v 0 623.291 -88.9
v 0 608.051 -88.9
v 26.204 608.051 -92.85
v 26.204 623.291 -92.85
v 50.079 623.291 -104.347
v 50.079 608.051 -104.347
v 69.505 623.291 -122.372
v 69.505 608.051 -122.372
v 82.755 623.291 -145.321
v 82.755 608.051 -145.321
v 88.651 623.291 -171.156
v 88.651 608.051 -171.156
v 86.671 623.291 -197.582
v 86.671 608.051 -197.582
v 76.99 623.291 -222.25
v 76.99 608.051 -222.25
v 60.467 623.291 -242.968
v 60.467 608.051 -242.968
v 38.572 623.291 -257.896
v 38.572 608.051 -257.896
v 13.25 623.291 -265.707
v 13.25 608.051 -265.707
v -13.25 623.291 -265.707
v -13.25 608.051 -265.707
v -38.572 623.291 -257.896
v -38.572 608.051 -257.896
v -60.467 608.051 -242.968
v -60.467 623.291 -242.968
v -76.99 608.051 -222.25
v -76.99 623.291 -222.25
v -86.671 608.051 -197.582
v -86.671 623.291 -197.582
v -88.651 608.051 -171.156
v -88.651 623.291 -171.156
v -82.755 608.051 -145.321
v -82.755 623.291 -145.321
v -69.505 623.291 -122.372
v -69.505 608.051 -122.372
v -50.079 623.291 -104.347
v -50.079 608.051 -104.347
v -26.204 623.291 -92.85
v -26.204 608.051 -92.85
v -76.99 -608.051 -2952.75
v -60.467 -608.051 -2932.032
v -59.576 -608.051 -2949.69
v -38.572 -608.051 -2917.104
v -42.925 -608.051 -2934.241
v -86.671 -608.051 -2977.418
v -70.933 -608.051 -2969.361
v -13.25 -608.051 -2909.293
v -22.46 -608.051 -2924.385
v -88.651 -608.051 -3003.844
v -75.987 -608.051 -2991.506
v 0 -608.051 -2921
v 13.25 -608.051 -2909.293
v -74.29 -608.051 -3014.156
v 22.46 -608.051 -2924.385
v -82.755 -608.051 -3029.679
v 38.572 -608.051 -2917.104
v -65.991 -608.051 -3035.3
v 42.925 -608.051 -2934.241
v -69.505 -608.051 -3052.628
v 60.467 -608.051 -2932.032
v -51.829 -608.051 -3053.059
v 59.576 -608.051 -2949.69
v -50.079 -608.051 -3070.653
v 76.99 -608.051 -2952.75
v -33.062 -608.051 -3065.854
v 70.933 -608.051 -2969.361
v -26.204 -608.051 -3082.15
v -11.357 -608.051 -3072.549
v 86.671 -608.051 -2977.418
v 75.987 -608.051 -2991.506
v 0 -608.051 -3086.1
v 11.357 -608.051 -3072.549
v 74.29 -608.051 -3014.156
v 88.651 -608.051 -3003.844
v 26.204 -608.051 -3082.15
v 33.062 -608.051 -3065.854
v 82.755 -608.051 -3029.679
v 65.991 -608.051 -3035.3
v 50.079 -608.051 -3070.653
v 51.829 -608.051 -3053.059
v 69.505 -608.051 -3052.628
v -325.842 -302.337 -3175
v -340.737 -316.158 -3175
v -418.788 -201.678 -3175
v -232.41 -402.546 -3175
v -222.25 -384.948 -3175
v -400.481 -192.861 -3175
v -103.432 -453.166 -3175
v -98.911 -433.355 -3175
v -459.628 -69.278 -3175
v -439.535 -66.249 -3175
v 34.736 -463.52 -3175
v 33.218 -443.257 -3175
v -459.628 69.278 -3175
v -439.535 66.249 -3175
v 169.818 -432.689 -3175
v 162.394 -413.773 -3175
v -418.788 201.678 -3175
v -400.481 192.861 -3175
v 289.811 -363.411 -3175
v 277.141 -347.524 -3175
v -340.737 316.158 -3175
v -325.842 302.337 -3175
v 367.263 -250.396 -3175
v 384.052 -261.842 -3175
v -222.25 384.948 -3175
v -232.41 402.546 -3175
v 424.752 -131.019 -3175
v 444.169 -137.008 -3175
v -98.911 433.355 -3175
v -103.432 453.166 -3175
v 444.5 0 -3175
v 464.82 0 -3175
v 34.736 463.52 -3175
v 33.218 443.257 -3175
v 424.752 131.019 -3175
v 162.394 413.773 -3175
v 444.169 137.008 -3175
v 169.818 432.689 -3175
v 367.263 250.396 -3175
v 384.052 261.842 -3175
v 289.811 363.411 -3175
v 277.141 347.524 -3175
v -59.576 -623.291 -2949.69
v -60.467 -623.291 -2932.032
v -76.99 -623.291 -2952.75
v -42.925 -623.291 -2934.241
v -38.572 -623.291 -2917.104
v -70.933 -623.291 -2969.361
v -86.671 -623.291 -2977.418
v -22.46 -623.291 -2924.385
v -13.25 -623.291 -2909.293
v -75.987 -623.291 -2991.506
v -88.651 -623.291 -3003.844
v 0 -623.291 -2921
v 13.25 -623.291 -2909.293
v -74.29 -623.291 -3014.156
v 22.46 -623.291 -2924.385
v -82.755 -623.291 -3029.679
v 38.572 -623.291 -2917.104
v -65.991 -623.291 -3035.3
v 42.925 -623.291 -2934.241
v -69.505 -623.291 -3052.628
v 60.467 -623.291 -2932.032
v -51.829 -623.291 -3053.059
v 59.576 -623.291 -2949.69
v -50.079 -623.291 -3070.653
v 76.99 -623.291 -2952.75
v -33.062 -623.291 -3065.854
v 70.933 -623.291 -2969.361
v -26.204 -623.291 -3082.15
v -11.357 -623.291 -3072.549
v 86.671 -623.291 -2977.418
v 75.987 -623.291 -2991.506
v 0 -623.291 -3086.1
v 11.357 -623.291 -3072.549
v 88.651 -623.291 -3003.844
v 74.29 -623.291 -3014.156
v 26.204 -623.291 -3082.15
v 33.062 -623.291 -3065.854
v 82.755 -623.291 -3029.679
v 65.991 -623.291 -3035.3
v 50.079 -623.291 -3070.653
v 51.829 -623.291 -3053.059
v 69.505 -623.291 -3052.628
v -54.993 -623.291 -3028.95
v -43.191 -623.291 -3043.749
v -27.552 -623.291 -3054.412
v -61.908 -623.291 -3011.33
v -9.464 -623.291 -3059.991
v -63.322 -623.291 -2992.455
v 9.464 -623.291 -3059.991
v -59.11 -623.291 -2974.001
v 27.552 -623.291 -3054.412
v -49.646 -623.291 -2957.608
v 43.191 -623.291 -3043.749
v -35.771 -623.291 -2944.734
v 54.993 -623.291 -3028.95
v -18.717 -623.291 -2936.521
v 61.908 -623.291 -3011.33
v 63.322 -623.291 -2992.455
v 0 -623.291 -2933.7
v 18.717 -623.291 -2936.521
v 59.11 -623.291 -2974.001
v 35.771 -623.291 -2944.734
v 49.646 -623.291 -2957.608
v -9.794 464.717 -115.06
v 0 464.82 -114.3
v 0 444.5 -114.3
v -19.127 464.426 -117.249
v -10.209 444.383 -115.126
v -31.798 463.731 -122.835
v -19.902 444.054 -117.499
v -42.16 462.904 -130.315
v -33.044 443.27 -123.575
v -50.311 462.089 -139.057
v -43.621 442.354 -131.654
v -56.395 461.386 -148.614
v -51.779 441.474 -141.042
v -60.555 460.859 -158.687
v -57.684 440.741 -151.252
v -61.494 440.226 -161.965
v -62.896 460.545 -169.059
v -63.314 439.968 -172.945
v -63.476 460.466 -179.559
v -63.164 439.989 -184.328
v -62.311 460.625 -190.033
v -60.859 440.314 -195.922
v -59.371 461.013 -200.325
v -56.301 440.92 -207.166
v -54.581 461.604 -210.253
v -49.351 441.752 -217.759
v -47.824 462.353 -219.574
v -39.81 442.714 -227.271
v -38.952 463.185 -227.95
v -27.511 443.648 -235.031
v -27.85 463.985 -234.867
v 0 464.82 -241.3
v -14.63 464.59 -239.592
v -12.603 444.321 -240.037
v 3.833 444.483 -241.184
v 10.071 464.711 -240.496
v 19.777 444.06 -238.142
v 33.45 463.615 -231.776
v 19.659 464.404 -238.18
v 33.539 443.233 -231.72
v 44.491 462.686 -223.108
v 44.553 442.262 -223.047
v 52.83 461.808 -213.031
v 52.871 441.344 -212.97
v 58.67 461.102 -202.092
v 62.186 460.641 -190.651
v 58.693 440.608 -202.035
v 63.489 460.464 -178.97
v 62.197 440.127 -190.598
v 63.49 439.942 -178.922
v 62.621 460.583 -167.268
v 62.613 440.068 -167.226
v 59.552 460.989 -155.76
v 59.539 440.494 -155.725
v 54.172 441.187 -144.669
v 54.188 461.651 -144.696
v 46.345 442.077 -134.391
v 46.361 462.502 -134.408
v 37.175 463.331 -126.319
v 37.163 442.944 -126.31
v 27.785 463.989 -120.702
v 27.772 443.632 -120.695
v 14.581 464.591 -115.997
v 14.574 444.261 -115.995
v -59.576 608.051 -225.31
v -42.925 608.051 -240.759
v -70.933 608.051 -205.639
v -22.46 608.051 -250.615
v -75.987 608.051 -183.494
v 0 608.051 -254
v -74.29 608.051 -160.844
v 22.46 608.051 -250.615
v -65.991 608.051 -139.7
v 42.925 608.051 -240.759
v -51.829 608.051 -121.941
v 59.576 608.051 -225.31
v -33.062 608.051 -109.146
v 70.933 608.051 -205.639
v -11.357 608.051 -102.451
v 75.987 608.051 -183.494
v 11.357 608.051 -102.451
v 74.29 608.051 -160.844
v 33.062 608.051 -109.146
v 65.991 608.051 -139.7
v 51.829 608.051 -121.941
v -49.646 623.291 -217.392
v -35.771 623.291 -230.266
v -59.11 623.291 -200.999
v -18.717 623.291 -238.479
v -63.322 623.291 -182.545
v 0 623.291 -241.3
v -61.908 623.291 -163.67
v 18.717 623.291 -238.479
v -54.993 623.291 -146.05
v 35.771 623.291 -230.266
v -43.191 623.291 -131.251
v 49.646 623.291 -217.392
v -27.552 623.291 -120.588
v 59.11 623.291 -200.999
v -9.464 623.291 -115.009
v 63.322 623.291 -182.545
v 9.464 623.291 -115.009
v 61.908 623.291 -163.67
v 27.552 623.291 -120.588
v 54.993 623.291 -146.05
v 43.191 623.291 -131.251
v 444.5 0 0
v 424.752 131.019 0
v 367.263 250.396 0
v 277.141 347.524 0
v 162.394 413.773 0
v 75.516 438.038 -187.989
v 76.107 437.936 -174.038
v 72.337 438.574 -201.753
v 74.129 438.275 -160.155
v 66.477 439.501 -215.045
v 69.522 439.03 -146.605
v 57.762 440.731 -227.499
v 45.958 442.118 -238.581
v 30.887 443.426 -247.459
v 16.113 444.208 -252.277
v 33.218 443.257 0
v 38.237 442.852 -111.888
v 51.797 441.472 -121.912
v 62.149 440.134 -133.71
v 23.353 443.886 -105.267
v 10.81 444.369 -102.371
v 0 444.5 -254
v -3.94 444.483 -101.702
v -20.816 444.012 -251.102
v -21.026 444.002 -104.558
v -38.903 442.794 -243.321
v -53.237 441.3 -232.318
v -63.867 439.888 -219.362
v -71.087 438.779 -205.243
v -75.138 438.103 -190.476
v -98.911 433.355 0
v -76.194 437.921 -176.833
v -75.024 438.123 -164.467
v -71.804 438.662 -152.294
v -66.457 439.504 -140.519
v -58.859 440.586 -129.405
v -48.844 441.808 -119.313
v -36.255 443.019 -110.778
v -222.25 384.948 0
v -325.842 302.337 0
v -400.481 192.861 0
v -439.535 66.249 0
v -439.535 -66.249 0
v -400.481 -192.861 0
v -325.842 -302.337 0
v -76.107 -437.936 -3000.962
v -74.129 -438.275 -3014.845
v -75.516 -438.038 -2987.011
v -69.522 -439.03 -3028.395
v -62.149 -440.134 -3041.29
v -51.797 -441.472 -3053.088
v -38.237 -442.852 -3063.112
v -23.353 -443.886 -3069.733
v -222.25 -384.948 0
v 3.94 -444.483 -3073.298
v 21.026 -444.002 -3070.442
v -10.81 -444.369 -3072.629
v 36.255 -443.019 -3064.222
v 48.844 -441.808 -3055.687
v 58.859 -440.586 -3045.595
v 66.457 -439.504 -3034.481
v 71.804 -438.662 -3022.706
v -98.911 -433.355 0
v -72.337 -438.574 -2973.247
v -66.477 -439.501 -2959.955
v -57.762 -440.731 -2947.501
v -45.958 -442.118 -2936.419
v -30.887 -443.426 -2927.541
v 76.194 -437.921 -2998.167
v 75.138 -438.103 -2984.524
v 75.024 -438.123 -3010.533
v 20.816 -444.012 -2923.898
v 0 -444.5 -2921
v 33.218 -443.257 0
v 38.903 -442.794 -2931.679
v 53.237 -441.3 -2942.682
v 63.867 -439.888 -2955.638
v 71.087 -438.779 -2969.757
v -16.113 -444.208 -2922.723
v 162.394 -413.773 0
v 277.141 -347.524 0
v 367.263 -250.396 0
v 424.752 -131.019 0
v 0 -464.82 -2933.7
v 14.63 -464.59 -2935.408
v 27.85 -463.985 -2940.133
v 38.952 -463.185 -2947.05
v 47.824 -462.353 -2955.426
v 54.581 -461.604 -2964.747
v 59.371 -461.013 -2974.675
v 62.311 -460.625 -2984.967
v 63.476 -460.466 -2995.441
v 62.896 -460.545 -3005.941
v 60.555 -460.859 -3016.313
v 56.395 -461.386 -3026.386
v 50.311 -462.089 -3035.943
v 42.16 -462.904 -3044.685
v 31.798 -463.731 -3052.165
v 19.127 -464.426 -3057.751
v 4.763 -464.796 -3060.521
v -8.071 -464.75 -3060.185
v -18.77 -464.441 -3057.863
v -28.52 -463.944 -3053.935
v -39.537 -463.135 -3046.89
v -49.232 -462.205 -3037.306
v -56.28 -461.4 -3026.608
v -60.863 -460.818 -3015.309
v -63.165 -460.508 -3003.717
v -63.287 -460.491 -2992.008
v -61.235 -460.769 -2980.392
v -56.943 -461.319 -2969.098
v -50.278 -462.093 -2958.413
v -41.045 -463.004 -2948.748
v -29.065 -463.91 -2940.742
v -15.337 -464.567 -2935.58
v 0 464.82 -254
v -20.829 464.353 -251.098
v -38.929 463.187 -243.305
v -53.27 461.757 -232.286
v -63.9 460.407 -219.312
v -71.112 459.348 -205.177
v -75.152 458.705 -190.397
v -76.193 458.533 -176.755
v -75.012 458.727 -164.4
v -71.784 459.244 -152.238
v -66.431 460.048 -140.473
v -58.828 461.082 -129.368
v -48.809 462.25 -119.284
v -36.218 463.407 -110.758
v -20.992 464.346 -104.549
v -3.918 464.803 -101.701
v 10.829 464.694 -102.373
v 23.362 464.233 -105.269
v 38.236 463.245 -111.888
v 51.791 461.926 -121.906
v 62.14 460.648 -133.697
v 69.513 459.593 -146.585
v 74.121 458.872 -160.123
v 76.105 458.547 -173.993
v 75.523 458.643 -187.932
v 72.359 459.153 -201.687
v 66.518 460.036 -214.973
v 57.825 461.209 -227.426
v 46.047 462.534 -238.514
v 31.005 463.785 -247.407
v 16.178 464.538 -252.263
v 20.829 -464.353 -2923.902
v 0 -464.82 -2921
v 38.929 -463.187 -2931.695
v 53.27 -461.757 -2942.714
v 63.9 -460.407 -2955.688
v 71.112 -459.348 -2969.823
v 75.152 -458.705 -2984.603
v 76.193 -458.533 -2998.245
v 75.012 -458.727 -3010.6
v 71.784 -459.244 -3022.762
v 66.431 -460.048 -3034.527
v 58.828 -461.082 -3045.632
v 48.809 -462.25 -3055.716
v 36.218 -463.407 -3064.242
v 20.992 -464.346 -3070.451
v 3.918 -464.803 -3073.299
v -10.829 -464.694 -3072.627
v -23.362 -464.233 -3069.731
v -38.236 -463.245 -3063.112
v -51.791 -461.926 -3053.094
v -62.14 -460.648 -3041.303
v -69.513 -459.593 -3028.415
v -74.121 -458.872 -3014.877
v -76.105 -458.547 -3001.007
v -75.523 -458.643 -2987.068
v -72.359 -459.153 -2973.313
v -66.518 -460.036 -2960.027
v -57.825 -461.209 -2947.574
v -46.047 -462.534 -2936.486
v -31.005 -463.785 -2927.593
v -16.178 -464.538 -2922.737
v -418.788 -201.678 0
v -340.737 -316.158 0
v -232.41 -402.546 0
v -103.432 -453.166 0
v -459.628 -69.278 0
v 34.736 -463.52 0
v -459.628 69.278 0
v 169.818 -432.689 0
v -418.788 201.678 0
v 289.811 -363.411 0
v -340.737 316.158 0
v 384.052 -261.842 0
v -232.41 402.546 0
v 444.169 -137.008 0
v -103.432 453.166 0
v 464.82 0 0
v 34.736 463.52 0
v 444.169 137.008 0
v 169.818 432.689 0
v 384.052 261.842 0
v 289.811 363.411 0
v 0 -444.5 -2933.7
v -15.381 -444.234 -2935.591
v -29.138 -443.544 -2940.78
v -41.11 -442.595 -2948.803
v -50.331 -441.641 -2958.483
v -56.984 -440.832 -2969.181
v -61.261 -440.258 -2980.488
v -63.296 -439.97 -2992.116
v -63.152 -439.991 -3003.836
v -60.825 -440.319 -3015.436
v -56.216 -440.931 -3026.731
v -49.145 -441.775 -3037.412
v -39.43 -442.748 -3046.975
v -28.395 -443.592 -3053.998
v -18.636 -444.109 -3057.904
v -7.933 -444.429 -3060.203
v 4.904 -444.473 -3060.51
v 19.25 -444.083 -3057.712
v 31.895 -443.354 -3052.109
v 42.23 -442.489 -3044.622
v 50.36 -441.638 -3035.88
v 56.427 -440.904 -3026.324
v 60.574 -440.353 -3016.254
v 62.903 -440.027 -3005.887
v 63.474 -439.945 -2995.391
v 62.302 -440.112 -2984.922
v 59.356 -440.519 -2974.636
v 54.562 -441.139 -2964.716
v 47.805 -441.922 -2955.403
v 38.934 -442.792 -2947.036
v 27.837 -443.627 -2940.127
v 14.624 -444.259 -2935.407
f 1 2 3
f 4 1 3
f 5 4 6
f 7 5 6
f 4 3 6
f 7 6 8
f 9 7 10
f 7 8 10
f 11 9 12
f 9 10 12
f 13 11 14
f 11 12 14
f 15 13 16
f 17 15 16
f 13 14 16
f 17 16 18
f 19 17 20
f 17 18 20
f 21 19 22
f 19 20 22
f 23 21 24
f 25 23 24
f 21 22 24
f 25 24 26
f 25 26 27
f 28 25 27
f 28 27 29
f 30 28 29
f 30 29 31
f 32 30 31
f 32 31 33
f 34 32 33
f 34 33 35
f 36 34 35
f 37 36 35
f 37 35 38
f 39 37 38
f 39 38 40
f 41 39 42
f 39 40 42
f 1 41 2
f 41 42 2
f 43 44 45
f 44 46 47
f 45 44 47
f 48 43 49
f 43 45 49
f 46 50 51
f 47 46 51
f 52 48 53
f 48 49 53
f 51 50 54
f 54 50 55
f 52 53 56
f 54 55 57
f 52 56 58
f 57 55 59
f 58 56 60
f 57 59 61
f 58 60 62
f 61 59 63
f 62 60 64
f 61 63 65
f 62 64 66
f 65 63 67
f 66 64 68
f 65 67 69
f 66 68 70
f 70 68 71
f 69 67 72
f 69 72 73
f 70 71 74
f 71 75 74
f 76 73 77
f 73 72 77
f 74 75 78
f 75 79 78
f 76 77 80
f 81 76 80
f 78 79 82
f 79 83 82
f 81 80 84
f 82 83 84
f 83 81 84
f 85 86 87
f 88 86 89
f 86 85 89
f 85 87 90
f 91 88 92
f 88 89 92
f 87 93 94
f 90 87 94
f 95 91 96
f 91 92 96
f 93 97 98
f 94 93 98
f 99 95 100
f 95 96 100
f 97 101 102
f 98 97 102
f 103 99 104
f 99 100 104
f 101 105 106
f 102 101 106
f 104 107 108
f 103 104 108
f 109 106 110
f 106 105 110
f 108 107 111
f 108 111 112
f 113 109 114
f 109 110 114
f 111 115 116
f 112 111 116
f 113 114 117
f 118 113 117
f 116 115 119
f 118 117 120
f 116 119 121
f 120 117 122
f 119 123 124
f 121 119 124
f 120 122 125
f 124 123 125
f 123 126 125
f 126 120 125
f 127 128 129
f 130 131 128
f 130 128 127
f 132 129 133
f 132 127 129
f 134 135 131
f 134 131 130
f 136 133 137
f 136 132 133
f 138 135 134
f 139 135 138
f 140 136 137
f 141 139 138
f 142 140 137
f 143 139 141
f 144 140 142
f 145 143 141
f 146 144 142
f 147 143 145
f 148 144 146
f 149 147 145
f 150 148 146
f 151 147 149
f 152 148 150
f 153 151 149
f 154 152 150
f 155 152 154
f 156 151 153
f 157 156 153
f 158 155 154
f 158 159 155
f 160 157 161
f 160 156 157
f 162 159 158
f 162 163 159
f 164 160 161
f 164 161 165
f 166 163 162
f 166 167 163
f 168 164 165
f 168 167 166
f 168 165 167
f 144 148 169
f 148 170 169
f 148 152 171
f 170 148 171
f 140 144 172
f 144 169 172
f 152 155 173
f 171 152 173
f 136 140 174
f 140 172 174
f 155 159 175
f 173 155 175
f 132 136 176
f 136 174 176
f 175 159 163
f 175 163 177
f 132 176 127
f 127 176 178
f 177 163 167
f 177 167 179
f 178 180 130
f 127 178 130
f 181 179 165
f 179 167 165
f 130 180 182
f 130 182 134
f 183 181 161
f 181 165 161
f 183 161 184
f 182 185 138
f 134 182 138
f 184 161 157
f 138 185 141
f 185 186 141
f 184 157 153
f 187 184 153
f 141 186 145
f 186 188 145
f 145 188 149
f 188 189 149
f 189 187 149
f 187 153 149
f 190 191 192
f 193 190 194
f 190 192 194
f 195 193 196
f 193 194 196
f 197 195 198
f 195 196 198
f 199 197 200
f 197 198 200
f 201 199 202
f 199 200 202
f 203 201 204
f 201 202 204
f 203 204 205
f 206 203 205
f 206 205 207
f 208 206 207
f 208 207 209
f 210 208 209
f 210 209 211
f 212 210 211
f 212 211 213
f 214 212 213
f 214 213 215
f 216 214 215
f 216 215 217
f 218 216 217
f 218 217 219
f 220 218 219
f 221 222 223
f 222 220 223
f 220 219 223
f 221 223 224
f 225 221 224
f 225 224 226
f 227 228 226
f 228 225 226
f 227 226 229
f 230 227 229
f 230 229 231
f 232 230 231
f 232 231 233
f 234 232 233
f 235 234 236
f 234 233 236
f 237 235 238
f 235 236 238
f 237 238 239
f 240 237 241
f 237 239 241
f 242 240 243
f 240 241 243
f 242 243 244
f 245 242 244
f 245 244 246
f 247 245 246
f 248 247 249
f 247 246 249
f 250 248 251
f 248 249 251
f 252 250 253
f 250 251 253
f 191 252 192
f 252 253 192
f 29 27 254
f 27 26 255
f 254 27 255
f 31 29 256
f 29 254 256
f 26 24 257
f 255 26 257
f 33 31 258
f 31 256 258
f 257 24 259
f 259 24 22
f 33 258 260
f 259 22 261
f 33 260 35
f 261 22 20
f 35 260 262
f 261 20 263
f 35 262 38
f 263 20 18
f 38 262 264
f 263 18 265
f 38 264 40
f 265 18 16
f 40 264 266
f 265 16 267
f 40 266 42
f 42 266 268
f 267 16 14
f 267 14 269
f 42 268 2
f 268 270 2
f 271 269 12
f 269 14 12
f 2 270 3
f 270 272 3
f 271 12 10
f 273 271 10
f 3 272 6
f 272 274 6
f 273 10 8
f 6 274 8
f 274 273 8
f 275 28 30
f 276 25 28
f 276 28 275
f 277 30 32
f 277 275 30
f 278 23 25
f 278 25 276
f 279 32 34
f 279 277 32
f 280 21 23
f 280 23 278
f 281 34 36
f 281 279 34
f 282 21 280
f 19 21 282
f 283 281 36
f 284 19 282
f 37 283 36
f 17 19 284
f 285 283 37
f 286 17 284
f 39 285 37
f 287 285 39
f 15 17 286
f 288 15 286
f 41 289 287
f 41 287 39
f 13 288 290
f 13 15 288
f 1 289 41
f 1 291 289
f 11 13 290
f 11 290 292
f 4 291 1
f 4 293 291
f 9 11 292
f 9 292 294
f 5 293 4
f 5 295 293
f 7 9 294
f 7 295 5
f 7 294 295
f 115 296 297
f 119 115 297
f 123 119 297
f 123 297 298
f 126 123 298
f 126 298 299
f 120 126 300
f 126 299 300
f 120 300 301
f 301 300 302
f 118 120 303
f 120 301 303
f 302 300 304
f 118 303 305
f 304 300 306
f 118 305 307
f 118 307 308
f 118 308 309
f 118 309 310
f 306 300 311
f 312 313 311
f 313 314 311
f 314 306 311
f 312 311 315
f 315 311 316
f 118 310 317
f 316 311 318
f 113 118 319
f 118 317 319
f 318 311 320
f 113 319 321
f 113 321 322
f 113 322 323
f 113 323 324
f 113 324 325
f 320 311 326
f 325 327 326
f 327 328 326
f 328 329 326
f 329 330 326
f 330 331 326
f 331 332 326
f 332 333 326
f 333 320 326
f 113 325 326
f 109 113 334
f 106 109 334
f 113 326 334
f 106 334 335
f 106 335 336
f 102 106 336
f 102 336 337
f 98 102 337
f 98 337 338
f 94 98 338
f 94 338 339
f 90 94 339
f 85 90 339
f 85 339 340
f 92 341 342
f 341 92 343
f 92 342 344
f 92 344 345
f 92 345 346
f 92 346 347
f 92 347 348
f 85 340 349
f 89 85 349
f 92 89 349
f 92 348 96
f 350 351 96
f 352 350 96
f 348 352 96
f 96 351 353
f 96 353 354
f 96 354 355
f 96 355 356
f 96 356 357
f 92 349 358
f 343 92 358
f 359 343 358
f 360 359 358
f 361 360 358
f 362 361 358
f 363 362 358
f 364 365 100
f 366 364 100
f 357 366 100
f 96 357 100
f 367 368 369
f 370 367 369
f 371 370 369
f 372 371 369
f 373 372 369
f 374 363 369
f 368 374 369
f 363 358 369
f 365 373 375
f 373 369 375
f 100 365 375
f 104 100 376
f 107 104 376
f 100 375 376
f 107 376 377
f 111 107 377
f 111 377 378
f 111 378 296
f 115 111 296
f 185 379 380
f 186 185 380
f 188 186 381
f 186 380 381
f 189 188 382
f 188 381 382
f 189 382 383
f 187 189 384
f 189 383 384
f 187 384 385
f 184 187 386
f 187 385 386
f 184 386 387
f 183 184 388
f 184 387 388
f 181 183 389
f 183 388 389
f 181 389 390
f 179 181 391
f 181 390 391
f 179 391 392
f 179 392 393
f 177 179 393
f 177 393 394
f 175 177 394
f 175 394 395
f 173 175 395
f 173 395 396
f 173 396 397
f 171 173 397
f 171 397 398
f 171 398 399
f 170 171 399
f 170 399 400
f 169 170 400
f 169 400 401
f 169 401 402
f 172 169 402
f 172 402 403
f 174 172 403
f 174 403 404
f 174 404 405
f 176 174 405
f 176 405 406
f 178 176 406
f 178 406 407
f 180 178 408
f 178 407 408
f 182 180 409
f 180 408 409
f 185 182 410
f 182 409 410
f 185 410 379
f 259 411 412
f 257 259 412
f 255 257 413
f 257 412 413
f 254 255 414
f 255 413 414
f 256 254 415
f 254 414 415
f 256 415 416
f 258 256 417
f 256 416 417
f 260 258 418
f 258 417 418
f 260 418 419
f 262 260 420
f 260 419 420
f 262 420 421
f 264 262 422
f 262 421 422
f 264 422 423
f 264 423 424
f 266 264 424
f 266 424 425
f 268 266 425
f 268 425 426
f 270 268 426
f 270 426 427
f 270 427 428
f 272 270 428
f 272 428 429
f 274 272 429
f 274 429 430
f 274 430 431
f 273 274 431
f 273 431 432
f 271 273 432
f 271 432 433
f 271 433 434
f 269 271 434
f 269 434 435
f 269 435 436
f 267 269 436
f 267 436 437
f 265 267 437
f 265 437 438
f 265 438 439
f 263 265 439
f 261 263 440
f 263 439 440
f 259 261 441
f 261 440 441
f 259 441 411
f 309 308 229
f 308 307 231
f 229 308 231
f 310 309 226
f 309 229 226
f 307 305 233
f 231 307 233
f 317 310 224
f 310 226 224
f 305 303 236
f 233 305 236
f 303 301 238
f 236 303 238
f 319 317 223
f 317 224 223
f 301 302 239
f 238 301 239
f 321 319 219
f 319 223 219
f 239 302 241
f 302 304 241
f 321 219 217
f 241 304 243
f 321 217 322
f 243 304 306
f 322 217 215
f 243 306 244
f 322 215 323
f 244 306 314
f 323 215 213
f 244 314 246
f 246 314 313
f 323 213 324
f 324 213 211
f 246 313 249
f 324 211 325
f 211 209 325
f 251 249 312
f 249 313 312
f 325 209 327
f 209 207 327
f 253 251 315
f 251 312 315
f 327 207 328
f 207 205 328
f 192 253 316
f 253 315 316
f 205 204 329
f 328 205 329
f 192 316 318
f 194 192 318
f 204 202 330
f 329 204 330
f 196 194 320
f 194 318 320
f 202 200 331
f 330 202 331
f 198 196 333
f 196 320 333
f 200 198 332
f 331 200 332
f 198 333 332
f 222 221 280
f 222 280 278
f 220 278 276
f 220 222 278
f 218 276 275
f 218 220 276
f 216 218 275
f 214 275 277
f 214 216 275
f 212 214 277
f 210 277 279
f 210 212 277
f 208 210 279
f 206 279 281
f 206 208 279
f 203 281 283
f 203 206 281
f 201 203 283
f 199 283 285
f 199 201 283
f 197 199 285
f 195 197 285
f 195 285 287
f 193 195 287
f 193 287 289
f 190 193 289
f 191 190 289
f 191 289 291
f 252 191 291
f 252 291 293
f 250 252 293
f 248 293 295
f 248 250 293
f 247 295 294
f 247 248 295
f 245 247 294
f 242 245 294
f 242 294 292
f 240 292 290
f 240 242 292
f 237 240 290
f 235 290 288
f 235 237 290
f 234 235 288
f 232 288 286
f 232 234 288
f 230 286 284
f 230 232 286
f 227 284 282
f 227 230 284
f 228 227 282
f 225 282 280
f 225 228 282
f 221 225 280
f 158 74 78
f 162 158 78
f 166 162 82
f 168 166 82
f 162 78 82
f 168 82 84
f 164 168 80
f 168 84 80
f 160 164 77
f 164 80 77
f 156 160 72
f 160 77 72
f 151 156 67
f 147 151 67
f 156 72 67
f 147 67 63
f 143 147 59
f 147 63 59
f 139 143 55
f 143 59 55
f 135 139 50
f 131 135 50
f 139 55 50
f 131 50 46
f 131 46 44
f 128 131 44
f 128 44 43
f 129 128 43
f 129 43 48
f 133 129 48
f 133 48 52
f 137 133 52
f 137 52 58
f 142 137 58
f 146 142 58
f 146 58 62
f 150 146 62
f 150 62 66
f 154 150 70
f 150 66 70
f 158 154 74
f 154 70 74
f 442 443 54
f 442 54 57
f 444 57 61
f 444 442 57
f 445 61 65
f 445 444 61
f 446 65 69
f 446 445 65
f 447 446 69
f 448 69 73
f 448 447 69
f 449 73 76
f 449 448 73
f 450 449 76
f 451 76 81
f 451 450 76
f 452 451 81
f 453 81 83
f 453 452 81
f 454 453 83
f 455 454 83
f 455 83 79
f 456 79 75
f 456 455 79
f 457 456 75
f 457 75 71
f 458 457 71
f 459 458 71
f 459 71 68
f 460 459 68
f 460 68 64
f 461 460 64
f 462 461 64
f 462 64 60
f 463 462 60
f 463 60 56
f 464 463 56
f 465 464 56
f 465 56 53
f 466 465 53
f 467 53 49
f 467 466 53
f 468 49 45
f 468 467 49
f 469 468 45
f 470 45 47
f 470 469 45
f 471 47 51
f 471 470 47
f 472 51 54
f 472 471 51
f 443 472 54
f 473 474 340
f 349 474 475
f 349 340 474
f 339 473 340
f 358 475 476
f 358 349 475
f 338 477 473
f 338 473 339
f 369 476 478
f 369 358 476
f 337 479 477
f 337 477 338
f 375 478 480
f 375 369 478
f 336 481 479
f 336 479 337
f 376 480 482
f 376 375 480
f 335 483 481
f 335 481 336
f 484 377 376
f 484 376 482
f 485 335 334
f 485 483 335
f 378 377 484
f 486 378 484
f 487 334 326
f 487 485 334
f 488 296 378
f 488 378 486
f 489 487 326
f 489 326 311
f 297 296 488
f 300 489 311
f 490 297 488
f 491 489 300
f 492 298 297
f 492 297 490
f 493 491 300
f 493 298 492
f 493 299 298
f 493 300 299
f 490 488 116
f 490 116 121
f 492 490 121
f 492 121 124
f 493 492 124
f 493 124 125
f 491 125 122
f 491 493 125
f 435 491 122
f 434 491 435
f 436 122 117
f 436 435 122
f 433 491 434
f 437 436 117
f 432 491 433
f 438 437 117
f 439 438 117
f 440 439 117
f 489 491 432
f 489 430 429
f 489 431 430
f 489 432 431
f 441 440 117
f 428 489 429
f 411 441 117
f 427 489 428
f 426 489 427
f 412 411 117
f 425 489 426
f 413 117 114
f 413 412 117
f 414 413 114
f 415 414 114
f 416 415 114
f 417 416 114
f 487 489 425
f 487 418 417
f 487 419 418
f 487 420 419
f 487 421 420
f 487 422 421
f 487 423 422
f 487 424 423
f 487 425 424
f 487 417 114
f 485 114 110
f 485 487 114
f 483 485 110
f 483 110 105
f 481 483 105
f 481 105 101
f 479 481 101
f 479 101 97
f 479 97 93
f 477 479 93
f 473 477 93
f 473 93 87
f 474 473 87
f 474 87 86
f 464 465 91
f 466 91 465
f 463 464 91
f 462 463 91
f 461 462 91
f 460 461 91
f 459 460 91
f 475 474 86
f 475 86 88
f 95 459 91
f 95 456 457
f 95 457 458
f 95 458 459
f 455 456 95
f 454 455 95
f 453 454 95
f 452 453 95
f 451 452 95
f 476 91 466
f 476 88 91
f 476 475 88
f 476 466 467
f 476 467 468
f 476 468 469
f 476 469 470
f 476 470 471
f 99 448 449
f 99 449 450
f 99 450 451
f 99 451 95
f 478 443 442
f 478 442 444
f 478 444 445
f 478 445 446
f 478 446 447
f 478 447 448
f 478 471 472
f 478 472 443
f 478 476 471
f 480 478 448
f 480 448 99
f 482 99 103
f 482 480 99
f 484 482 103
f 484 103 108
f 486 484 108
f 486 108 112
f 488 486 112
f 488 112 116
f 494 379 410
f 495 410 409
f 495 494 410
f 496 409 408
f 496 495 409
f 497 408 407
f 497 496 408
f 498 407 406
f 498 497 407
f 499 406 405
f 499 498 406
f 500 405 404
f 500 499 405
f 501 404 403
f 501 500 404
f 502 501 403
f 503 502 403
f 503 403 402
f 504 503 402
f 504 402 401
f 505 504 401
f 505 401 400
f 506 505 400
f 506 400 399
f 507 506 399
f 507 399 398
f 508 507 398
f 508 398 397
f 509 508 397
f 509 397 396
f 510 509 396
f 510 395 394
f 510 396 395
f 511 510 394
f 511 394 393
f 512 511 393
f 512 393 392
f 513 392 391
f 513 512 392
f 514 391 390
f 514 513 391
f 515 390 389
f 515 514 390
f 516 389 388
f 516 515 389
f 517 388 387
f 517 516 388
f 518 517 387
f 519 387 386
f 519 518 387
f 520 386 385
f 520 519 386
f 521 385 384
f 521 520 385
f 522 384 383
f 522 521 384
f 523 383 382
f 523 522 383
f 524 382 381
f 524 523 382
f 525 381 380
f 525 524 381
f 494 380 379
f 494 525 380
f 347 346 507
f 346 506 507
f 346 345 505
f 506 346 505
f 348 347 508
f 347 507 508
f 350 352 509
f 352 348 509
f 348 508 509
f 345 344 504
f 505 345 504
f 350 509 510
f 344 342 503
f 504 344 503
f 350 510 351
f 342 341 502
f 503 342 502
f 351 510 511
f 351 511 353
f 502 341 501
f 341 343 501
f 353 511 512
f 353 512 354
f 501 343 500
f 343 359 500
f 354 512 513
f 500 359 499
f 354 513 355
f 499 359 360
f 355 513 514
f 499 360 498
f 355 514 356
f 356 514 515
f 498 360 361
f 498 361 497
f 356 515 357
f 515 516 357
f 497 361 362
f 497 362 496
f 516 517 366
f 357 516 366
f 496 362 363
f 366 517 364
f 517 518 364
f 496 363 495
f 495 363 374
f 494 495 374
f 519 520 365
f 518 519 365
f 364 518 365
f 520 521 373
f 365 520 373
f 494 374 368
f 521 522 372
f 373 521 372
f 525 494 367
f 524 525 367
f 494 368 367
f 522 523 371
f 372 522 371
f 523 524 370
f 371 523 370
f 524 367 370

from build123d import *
from build123d.topology import SkipClean

# Parameters (mm, degrees)
SKETCH1_R           = 464.82
SKETCH1_R_2         = 444.5
BOSS_EXTRUDE1_DEPTH = 3175
BOSS_EXTRUDE2_START = 369.2906
SKETCH2_R           = 76.2
SKETCH2_R_2         = 63.5
BOSS_EXTRUDE2_DEPTH = 254
SKETCH3_R           = 63.5
CUT_EXTRUDE1_DEPTH  = 742.4928
BOSS_EXTRUDE3_START = -15.24
SKETCH4_R           = 88.9
SKETCH4_R_2         = 76.2
BOSS_EXTRUDE3_DEPTH = 15.24
BOSS_EXTRUDE4_START = -369.2906
SKETCH5_R           = 76.2
SKETCH5_R_2         = 63.5
BOSS_EXTRUDE4_DEPTH = 254
CUT_EXTRUDE2_START  = -736.6
SKETCH6_R           = 63.5
CUT_EXTRUDE2_DEPTH  = 736.6
SKETCH7_R           = 444.5
CUT_EXTRUDE3_DEPTH  = 3175
BOSS_EXTRUDE5_START = -15.24
SKETCH9_R           = 88.9
SKETCH9_R_2         = 76.2
BOSS_EXTRUDE5_DEPTH = 15.24


with BuildPart() as part:
    # Sketch1 → Boss-Extrude1 (new body)
    with BuildSketch(Plane.XY):
        Circle(SKETCH1_R)
        Circle(SKETCH1_R_2, mode=Mode.SUBTRACT)
    extrude(amount=-BOSS_EXTRUDE1_DEPTH)

    # Sketch2 → Boss-Extrude2 (add)
    with BuildSketch(Plane(origin=(0, 0, 0), x_dir=(1, 0, 0), z_dir=(0, 1, 0)).offset(BOSS_EXTRUDE2_START)):
        with Locations(Location((0, 177.8, 0), (0, 0, 90))):
            Circle(SKETCH2_R)
        with Locations(Location((0, 177.8, 0), (0, 0, 90))):
            Circle(SKETCH2_R_2, mode=Mode.SUBTRACT)
    extrude(amount=BOSS_EXTRUDE2_DEPTH)

    # Sketch3 → Cut-Extrude1 (cut)
    with SkipClean():  # the faces are left unmerged after this step: merging them gives an invalid solid
        with BuildSketch(Plane.XZ.offset(-369.2906)):
            with Locations(Location((0, -177.8, 0), (0, 0, 90))):
                Circle(SKETCH3_R)
        extrude(amount=-CUT_EXTRUDE1_DEPTH, mode=Mode.SUBTRACT)

    # Sketch4 → Boss-Extrude3 (add)
    with BuildSketch(Plane(origin=(0, 623.2906, 0), x_dir=(1, 0, 0), z_dir=(0, 1, 0)).offset(BOSS_EXTRUDE3_START)):
        with Locations(Location((0, 177.8, 0), (0, 0, 270))):
            Circle(SKETCH4_R)
        with Locations(Location((0, 177.8, 0), (0, 0, 90))):
            Circle(SKETCH4_R_2, mode=Mode.SUBTRACT)
    extrude(amount=BOSS_EXTRUDE3_DEPTH)

    # Sketch5 → Boss-Extrude4 (add)
    with BuildSketch(Plane(origin=(0, 0, 0), x_dir=(1, 0, 0), z_dir=(0, 1, 0)).offset(BOSS_EXTRUDE4_START)):
        with Locations(Location((0, 2997.2, 0), (0, 0, 270))):
            Circle(SKETCH5_R)
        with Locations(Location((0, 2997.2, 0), (0, 0, 270))):
            Circle(SKETCH5_R_2, mode=Mode.SUBTRACT)
    extrude(amount=-BOSS_EXTRUDE4_DEPTH)

    # Sketch6 → Cut-Extrude2 (cut)
    with BuildSketch(Plane.XZ.offset(623.2906).offset(CUT_EXTRUDE2_START)):
        with Locations(Location((0, -2997.2, 0), (0, 0, 90))):
            Circle(SKETCH6_R)
    extrude(amount=CUT_EXTRUDE2_DEPTH, mode=Mode.SUBTRACT)

    # Sketch7 → Cut-Extrude3 (cut)
    with BuildSketch(Plane.XY):
        Circle(SKETCH7_R)
    extrude(amount=-CUT_EXTRUDE3_DEPTH, mode=Mode.SUBTRACT)

    # Sketch9 → Boss-Extrude5 (add)
    with SkipClean():  # the faces are left unmerged after this step: merging them gives an invalid solid
        with BuildSketch(Plane.XZ.offset(623.2906).offset(BOSS_EXTRUDE5_START)):
            with Locations(Location((0, -2997.2, 0), (0, 0, 270))):
                Circle(SKETCH9_R)
            with Locations(Location((0, -2997.2, 0), (0, 0, 90))):
                Circle(SKETCH9_R_2, mode=Mode.SUBTRACT)
        extrude(amount=BOSS_EXTRUDE5_DEPTH)


solid = part.part
